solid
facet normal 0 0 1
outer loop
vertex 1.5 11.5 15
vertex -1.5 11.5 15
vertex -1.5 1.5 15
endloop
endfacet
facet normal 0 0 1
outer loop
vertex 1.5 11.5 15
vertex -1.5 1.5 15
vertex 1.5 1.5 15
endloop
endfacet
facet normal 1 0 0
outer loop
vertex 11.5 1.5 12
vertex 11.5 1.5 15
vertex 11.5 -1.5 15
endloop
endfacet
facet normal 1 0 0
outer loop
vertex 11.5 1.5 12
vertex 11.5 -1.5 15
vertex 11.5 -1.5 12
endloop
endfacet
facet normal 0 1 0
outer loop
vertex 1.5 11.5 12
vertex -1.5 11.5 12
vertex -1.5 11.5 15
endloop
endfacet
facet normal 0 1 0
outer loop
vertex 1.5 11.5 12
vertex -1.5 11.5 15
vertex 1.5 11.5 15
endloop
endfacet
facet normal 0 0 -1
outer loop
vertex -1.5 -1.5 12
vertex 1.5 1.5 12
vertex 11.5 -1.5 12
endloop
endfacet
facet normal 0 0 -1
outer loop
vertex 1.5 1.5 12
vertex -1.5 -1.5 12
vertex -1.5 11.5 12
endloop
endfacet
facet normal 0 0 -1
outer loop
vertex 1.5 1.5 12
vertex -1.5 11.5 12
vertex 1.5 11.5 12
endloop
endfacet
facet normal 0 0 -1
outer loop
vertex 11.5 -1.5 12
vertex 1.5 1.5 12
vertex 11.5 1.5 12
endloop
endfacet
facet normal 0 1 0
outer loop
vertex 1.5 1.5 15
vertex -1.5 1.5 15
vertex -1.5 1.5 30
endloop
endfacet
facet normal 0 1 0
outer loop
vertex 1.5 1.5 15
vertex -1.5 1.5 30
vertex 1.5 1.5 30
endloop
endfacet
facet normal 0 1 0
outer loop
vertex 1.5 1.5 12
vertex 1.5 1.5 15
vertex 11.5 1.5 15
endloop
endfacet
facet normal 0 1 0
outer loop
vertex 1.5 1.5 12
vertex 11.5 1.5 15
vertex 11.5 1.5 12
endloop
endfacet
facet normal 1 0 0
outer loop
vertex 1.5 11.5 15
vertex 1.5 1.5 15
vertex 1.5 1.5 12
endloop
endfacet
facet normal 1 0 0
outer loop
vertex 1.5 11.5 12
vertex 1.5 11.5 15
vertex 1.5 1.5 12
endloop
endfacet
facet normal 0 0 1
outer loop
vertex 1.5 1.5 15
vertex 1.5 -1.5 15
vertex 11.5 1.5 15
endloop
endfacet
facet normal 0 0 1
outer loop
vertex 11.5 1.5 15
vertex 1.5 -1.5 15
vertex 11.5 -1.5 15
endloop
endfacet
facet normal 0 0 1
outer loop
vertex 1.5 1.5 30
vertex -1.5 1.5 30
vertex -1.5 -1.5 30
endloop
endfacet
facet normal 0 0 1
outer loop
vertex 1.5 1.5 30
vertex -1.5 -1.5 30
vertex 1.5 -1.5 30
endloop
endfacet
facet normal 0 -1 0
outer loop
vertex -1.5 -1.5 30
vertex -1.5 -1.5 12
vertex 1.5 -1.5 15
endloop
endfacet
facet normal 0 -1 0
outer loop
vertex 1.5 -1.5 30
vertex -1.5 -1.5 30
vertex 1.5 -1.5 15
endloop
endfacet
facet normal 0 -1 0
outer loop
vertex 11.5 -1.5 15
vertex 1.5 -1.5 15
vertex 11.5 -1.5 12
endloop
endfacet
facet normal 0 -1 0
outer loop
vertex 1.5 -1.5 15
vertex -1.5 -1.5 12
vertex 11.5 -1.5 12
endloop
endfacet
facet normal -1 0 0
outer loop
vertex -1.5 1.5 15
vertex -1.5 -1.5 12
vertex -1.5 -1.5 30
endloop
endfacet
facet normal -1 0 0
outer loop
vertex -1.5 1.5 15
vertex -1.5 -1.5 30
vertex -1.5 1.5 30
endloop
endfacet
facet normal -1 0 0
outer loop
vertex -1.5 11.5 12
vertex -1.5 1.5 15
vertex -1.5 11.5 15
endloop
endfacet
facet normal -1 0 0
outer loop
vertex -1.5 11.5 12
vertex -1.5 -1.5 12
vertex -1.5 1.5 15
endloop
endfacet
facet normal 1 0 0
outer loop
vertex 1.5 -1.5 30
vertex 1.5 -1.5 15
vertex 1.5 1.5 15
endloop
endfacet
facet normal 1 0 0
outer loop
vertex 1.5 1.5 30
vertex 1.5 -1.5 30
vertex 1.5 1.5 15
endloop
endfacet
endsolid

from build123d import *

# Parameters (mm, degrees)
SKETCH1_W           = 3
SKETCH1_H           = 3
BOSS_EXTRUDE2_DEPTH = 15
SKETCH2_W           = 3
SKETCH2_H           = 3
BOSS_EXTRUDE3_DEPTH = 10
SKETCH3_W           = 3
SKETCH3_H           = 3
BOSS_EXTRUDE4_DEPTH = 10
SKETCH4_W           = 3
SKETCH4_H           = 3
BOSS_EXTRUDE5_DEPTH = 15
SKETCH1_2_W         = 3
SKETCH1_2_H         = 3
CUT_EXTRUDE1_DEPTH  = 12


with BuildPart() as part:
    # Sketch1 → Boss-Extrude2 (new body)
    with BuildSketch(Plane.XY):
        Rectangle(SKETCH1_W, SKETCH1_H)
    extrude(amount=BOSS_EXTRUDE2_DEPTH)

    # Sketch2 → Boss-Extrude3 (add)
    with BuildSketch(Plane(origin=(1.5, 0, 0), x_dir=(0, 0, -1), z_dir=(1, 0, 0))):
        with Locations((-13.5, 0)):
            Rectangle(SKETCH2_W, SKETCH2_H)
    extrude(amount=BOSS_EXTRUDE3_DEPTH)

    # Sketch3 → Boss-Extrude4 (add)
    with BuildSketch(Plane(origin=(0, 1.5, 0), x_dir=(1, 0, 0), z_dir=(0, 1, 0))):
        with Locations((0, -13.5)):
            Rectangle(SKETCH3_W, SKETCH3_H)
    extrude(amount=BOSS_EXTRUDE4_DEPTH)

    # Sketch4 → Boss-Extrude5 (add)
    with BuildSketch(Plane.XY.offset(15)):
        Rectangle(SKETCH4_W, SKETCH4_H)
    extrude(amount=BOSS_EXTRUDE5_DEPTH)

    # Sketch1<2> → Cut-Extrude1 (cut)
    with BuildSketch(Plane.XY):
        Rectangle(SKETCH1_2_W, SKETCH1_2_H)
    extrude(amount=CUT_EXTRUDE1_DEPTH, mode=Mode.SUBTRACT)


solid = part.part
